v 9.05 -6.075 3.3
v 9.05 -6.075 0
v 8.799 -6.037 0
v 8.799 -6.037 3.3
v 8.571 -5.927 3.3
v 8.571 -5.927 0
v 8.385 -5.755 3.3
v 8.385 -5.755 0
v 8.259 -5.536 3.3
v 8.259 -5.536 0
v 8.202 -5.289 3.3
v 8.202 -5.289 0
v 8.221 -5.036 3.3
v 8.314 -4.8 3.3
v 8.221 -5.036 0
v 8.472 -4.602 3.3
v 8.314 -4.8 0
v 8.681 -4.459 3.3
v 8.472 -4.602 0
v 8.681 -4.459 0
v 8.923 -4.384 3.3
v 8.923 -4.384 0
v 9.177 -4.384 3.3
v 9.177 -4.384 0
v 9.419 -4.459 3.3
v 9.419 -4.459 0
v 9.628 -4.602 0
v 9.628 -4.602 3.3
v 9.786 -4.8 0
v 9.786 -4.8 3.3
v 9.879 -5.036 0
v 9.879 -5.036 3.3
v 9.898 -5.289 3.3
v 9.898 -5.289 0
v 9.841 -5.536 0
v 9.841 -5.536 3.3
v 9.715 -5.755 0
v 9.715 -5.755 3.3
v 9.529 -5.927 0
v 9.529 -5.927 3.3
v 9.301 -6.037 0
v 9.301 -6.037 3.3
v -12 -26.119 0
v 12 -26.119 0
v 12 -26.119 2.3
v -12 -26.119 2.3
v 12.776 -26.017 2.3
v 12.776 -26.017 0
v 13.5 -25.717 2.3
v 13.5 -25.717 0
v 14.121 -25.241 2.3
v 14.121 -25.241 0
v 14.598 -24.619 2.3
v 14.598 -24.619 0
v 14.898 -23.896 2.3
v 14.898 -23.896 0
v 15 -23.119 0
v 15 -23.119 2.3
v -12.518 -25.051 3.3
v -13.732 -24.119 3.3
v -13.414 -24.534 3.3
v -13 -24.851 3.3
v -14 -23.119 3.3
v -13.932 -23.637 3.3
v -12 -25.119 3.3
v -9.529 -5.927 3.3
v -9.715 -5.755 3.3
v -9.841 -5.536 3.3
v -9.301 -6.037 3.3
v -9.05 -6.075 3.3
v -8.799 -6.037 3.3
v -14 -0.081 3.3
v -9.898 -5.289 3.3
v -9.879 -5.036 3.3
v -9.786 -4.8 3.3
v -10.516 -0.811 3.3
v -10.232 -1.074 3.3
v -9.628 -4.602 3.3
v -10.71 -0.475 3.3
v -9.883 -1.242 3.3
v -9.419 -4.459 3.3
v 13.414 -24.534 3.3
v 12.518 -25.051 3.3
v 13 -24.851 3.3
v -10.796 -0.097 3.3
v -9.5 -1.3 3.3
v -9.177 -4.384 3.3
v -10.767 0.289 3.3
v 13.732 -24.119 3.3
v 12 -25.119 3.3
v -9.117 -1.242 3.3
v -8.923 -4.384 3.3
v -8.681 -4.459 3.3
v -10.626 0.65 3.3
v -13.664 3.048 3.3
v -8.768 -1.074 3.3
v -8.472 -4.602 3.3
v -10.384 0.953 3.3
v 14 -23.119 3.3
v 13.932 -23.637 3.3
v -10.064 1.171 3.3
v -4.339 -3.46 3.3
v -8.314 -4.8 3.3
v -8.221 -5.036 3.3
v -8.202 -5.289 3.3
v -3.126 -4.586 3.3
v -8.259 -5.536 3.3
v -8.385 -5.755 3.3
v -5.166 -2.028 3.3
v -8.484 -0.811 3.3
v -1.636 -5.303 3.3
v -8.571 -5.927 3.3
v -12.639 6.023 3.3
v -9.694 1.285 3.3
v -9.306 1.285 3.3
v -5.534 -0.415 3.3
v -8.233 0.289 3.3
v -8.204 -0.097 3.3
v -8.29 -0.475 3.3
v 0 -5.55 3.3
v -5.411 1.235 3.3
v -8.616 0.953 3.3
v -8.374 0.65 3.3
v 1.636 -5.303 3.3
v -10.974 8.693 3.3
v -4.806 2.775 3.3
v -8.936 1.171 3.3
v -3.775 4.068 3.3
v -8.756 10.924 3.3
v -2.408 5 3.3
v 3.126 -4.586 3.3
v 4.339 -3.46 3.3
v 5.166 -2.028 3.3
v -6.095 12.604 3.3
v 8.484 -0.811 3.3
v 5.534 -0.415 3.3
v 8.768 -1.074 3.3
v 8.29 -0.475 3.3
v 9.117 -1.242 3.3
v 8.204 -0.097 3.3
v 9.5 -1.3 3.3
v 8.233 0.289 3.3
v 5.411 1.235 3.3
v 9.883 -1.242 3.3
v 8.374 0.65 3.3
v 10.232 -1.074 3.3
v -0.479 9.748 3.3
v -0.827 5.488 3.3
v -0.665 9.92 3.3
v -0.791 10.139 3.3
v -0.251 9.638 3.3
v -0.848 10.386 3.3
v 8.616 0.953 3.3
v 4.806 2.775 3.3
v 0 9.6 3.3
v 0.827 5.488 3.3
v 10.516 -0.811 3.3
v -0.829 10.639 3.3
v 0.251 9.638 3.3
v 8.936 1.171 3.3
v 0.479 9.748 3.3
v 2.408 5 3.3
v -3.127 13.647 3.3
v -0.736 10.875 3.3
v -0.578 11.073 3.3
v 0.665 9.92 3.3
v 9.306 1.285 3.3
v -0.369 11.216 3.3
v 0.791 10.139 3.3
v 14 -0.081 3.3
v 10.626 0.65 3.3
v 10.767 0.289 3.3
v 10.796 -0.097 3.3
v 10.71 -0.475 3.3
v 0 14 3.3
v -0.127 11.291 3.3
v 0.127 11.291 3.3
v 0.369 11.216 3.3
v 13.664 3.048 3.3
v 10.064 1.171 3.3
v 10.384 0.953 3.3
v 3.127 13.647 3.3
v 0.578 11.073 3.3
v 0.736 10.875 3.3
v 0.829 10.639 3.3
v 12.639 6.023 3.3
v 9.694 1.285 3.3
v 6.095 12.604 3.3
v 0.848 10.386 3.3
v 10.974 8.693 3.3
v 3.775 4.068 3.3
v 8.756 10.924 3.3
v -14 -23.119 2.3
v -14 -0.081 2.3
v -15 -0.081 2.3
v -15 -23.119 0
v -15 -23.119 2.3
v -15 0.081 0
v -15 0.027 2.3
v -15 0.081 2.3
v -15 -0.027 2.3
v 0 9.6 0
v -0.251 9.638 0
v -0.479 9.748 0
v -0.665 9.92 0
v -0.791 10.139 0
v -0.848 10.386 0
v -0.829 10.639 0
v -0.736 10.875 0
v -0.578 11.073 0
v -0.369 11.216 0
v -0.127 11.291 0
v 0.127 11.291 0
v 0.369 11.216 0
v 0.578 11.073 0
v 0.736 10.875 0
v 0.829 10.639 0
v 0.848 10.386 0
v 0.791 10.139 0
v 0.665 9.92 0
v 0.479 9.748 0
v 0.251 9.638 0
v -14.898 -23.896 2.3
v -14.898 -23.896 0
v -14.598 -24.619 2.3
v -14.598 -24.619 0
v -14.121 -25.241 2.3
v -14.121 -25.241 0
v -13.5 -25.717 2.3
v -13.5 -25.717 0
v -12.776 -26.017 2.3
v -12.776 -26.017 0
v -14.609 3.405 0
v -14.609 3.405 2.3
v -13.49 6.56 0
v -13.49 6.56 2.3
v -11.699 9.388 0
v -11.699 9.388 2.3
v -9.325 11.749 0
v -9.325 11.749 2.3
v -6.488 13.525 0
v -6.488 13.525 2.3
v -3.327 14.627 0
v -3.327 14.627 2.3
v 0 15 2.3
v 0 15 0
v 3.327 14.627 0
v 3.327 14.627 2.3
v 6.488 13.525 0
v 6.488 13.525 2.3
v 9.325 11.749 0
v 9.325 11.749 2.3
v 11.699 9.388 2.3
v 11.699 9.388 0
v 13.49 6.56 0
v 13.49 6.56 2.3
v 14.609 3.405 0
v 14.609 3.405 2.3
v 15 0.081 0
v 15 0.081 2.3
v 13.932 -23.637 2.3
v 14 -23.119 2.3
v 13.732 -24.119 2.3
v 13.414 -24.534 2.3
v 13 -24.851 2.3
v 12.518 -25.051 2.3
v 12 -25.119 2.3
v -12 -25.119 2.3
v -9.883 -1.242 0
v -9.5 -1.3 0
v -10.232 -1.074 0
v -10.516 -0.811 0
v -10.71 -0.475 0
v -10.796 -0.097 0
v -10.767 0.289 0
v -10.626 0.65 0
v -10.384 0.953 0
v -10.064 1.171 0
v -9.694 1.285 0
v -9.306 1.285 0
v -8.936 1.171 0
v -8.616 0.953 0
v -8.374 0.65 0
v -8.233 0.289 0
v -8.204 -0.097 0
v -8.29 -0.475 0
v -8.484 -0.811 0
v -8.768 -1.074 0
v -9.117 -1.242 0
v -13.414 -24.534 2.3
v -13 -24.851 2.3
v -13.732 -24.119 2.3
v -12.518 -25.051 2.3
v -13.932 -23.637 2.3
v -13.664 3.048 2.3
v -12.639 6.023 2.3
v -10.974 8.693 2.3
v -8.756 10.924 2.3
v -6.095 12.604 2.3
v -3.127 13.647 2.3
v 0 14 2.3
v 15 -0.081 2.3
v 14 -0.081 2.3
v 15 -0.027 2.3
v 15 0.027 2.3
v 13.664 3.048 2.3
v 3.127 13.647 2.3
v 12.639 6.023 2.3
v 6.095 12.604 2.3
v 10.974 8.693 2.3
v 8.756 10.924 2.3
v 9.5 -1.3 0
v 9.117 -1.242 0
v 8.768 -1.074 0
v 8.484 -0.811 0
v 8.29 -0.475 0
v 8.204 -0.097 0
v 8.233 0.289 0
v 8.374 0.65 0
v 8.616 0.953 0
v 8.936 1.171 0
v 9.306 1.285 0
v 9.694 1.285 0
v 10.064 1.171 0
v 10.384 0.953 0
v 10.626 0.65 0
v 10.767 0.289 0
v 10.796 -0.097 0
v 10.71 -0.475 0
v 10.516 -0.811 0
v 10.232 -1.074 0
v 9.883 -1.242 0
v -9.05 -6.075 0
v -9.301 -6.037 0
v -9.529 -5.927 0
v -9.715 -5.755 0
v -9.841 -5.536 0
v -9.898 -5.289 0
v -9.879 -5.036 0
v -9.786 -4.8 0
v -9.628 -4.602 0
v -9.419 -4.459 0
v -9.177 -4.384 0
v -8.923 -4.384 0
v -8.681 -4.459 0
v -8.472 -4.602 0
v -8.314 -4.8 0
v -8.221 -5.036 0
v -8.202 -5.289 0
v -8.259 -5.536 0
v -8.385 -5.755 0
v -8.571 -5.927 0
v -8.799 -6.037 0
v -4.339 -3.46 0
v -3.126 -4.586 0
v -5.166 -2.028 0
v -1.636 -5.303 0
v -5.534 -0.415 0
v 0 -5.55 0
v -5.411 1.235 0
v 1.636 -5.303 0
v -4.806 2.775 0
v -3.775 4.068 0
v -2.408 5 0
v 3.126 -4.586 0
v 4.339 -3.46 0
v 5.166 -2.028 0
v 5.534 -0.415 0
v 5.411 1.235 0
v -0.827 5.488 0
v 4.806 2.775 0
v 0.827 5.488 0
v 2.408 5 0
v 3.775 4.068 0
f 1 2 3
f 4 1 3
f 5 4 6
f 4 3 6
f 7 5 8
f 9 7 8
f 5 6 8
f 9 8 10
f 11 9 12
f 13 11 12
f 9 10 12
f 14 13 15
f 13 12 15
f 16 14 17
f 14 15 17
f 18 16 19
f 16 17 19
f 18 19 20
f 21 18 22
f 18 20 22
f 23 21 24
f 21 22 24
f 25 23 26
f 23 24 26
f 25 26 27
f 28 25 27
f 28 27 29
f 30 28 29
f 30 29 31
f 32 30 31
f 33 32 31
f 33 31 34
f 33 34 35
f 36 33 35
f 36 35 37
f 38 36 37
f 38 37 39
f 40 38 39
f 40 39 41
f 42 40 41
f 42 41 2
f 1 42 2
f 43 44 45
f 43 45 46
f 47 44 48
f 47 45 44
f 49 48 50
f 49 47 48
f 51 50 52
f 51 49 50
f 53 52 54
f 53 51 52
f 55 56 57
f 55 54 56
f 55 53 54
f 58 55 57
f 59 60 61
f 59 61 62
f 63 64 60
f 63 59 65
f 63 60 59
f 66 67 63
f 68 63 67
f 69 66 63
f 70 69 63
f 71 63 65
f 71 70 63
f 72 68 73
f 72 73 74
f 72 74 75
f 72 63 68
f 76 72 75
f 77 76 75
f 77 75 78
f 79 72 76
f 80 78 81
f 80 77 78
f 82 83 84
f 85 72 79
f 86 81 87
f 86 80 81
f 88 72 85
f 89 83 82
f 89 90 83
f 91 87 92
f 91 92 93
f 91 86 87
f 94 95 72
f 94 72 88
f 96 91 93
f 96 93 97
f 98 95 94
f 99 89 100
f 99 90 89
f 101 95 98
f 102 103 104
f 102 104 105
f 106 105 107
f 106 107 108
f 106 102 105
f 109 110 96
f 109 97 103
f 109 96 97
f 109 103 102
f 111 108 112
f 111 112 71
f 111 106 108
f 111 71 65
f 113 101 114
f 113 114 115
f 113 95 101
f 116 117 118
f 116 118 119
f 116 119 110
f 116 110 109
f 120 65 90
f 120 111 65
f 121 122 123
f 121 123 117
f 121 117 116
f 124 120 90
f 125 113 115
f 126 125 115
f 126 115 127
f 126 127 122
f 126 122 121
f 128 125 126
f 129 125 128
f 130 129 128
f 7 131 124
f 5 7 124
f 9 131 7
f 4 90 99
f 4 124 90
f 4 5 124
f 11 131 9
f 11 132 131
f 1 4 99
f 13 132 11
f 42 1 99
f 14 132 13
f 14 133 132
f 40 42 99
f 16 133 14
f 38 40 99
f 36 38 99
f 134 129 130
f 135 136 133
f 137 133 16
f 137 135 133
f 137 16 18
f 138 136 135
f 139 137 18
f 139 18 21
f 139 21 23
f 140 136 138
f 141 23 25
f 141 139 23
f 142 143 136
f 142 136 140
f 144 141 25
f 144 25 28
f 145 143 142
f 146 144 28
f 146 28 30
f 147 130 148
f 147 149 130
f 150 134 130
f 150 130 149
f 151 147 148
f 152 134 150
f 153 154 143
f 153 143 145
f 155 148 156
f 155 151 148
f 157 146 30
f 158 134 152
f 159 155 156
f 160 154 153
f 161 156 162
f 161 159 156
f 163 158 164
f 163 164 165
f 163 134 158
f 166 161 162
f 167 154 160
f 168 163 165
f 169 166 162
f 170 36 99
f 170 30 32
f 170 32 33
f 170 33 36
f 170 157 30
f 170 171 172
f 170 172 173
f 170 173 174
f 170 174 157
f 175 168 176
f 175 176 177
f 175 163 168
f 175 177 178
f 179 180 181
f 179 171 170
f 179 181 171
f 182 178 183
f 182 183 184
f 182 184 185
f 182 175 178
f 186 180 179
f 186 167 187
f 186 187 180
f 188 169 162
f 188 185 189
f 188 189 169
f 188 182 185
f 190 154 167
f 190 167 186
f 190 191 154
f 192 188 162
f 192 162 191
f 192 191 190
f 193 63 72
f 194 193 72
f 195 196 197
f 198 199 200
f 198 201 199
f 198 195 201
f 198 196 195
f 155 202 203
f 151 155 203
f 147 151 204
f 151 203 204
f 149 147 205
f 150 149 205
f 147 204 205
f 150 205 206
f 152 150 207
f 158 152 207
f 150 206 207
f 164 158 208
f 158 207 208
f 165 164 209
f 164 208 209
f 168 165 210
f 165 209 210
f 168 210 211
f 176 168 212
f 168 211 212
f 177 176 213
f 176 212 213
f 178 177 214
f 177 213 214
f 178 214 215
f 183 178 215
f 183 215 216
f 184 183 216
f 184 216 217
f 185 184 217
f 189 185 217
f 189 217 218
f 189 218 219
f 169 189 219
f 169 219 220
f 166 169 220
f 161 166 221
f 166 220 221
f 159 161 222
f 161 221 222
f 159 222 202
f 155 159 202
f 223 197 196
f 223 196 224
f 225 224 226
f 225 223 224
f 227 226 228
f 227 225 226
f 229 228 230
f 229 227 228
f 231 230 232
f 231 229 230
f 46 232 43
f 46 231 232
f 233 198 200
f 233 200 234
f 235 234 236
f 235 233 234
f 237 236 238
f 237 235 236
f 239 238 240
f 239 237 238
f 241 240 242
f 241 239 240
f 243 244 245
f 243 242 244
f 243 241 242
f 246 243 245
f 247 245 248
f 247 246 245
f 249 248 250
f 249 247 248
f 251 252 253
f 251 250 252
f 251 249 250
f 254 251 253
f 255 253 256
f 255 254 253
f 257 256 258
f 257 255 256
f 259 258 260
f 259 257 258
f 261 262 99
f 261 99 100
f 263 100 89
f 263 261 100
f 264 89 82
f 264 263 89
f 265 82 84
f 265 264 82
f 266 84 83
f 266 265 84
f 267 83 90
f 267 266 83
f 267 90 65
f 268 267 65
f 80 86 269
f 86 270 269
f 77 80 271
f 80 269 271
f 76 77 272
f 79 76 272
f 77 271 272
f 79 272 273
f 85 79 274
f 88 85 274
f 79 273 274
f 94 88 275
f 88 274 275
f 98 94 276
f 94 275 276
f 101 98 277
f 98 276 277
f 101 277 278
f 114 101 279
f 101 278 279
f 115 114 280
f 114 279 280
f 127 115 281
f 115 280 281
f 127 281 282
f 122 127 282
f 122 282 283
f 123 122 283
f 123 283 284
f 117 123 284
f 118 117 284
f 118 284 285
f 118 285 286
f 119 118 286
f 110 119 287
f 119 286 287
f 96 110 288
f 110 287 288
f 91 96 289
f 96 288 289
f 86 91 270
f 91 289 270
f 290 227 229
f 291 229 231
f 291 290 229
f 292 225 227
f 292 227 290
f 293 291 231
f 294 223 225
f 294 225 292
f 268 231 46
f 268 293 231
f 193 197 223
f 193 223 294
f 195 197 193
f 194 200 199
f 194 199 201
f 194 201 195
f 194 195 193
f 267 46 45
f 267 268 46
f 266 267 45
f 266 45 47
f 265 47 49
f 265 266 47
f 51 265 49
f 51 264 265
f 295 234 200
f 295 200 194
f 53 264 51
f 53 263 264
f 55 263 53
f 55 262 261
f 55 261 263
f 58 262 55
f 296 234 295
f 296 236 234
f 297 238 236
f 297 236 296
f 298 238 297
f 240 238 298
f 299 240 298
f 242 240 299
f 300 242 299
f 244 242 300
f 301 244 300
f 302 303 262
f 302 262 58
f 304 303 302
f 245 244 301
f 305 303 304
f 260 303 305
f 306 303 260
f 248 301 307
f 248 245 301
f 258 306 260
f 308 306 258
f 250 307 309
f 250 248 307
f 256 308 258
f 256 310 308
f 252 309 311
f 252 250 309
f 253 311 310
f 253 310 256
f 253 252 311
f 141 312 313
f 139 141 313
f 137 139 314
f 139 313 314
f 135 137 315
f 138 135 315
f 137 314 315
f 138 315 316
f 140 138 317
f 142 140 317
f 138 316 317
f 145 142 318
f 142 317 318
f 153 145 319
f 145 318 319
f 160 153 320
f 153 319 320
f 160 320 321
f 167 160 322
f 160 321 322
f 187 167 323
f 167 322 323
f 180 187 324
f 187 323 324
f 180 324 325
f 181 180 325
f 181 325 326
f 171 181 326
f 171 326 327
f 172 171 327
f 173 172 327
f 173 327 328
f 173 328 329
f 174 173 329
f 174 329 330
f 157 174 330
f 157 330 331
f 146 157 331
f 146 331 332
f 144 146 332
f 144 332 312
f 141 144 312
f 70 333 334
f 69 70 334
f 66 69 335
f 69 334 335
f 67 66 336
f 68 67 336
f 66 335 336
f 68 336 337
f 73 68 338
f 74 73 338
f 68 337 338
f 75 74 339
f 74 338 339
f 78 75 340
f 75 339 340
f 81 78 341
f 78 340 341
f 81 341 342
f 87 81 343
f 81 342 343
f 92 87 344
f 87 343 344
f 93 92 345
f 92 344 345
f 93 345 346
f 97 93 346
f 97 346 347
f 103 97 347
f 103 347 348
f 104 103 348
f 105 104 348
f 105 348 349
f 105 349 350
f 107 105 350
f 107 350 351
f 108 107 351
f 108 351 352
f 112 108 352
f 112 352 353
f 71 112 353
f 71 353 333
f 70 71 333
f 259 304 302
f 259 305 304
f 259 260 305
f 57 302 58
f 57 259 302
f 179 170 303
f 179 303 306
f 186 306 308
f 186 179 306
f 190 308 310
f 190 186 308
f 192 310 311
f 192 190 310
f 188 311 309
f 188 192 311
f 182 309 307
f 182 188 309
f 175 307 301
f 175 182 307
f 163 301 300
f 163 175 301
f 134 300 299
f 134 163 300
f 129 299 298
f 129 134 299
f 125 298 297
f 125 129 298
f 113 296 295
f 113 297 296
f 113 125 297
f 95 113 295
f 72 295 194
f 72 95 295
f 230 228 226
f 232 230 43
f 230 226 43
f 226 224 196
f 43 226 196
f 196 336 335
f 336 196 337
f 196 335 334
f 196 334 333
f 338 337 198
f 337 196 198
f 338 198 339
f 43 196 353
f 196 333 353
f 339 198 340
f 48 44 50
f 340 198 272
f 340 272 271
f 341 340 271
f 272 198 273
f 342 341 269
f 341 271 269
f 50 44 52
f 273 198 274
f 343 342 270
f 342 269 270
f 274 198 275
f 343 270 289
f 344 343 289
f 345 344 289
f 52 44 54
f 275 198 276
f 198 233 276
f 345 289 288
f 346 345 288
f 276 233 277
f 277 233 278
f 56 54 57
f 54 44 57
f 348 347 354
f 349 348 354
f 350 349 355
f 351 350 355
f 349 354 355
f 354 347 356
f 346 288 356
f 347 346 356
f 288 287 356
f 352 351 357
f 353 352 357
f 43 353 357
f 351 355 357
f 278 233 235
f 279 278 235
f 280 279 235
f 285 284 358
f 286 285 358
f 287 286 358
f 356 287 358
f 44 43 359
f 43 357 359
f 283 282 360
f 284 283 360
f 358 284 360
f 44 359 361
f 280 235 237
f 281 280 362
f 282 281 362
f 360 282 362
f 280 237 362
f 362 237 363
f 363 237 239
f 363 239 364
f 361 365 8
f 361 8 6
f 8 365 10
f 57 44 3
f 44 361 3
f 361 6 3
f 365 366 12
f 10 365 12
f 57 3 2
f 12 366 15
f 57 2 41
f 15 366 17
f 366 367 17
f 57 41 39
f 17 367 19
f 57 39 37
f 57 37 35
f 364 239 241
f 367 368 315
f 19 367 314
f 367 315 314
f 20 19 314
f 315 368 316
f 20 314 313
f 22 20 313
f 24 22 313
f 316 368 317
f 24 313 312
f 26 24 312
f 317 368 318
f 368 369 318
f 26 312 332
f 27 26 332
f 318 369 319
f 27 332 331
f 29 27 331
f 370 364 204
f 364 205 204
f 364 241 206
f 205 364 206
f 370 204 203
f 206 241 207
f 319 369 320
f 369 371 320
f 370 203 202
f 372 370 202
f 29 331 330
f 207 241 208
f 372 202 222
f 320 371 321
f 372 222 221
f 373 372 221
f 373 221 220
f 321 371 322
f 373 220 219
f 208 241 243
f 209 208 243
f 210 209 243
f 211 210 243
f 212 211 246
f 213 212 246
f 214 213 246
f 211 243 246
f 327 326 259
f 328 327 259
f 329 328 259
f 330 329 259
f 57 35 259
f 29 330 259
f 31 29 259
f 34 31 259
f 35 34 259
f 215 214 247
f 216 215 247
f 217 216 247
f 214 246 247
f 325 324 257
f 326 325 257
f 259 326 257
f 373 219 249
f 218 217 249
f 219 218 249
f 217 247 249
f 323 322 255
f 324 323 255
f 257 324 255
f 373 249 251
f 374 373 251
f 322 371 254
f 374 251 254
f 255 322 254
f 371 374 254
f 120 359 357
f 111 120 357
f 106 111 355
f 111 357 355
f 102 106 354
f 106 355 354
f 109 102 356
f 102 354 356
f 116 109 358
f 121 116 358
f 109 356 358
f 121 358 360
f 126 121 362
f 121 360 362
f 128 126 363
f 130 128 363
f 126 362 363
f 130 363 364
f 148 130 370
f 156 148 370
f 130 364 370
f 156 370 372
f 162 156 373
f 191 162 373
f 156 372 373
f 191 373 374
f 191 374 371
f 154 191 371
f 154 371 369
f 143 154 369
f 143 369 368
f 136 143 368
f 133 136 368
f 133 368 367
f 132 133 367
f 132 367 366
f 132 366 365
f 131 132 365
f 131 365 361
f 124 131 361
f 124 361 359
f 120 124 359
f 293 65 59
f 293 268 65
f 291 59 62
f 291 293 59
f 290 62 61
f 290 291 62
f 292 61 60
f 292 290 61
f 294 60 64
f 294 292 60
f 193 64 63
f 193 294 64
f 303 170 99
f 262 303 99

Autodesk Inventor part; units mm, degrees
ref_plane "YZ Plane" through (0, 0, 0) normal (1, 0, 0) x (0, 1, 0)
ref_plane "XZ Plane" through (0, 0, 0) normal (0, 1, 0) x (-1, 0, 0)
ref_plane "XY Plane" through (0, 0, 0) normal (0, 0, 1) x (1, 0, 0)
sketch "スケッチ1" plane through (0, 0, 0) normal (0, 0, 1) x (1, 0, 0)
  line L0 (-15, 0.0806) -> (15, 0.0806)
  line L1 (15, 0.0806) -> (15, -26.1194)
  line L2 (15, -26.1194) -> (-15, -26.1194)
  line L3 (-15, -26.1194) -> (-15, 0.0806)
  circle A0 centre (0, 0) radius 15.0002
  dimension "d0" = 30
  dimension "d1" = 15
  dimension "d2" = 26.2
extrude "押し出し1" add sketch "スケッチ1" along normal blind 3.3
sketch "スケッチ2" plane through (0, 0, 3.3) normal (0, 0, 1) x (1, 0, 0)
  arc A0 (15, -0.0806) -> (-15, -0.0806) centre (0, 0) ccw projected
  circle A1 centre (0, 0) radius 9.5
  point P0 (-9.5, 0)
  point P1 (9.5, 0)
  dimension "d5" = 19
hole "Hole1" at (-9.5, 0, 3.3) at (9.5, 0, 3.3) direction (0, 0, -1) diameter 2.6 depth 10
sketch "スケッチ3" plane through (0, 0, 3.3) normal (0, 0, 1) x (1, 0, 0)
  arc A0 (15, -0.0806) -> (-15, -0.0806) centre (0, 0) ccw projected
hole "Hole2" at (0, 0, 3.3) direction (0, 0, -1) diameter 11.1 depth 10 tip angle 118
sketch "スケッチ4" plane through (0, 0, 3.3) normal (0, 0, 1) x (1, 0, 0)
  arc A0 (15, -0.0806) -> (-15, -0.0806) centre (0, 0) ccw projected
  line L0 (-15, -26.1194) -> (-15, -0.0806) projected
  line L1 (15, -26.1194) -> (-15, -26.1194) projected
  line L2 (15, -0.0806) -> (15, -26.1194) projected
  line L3 (-14, -0.0806) -> (14, -0.0806)
  line L4 (14, -0.0806) -> (14, -25.1194)
  line L5 (14, -25.1194) -> (-14, -25.1194)
  line L6 (-14, -25.1194) -> (-14, -0.0806)
  circle A1 centre (0, 0) radius 14.0002
  dimension "d20" = 1
  dimension "d21" = 1
  dimension "d22" = 1
extrude "押し出し2" cut sketch "スケッチ4" against normal blind 1
fillet "フィレット1" radius 3 2 edges at (15, -26.1194, 1.15) (-15, -26.1194, 1.15)
fillet "フィレット2" radius 2 2 edges at (14, -25.1194, 2.8) (-14, -25.1194, 2.8)
sketch "スケッチ5" plane through (0, 0, 3.3) normal (0, 0, 1) x (1, 0, 0)
  circle A0 centre (0, 0) radius 5.55 projected
  circle A1 centre (0, 0) radius 10.45
  point P0 (0, 10.45)
  point P1 (-9.05, -5.225)
  point P2 (9.05, -5.225)
  dimension "d27" = 20.9
  dimension "d30" = 360
hole "Hole3" at (0, 10.45, 3.3) at (-9.05, -5.225, 3.3) at (9.05, -5.225, 3.3) direction (0, 0, -1) diameter 1.7 end through all
equation "\"d1\" = 0.5 * d0"
equation "\"d22\" = d21"
properties part number "HEDS-5500_A"
